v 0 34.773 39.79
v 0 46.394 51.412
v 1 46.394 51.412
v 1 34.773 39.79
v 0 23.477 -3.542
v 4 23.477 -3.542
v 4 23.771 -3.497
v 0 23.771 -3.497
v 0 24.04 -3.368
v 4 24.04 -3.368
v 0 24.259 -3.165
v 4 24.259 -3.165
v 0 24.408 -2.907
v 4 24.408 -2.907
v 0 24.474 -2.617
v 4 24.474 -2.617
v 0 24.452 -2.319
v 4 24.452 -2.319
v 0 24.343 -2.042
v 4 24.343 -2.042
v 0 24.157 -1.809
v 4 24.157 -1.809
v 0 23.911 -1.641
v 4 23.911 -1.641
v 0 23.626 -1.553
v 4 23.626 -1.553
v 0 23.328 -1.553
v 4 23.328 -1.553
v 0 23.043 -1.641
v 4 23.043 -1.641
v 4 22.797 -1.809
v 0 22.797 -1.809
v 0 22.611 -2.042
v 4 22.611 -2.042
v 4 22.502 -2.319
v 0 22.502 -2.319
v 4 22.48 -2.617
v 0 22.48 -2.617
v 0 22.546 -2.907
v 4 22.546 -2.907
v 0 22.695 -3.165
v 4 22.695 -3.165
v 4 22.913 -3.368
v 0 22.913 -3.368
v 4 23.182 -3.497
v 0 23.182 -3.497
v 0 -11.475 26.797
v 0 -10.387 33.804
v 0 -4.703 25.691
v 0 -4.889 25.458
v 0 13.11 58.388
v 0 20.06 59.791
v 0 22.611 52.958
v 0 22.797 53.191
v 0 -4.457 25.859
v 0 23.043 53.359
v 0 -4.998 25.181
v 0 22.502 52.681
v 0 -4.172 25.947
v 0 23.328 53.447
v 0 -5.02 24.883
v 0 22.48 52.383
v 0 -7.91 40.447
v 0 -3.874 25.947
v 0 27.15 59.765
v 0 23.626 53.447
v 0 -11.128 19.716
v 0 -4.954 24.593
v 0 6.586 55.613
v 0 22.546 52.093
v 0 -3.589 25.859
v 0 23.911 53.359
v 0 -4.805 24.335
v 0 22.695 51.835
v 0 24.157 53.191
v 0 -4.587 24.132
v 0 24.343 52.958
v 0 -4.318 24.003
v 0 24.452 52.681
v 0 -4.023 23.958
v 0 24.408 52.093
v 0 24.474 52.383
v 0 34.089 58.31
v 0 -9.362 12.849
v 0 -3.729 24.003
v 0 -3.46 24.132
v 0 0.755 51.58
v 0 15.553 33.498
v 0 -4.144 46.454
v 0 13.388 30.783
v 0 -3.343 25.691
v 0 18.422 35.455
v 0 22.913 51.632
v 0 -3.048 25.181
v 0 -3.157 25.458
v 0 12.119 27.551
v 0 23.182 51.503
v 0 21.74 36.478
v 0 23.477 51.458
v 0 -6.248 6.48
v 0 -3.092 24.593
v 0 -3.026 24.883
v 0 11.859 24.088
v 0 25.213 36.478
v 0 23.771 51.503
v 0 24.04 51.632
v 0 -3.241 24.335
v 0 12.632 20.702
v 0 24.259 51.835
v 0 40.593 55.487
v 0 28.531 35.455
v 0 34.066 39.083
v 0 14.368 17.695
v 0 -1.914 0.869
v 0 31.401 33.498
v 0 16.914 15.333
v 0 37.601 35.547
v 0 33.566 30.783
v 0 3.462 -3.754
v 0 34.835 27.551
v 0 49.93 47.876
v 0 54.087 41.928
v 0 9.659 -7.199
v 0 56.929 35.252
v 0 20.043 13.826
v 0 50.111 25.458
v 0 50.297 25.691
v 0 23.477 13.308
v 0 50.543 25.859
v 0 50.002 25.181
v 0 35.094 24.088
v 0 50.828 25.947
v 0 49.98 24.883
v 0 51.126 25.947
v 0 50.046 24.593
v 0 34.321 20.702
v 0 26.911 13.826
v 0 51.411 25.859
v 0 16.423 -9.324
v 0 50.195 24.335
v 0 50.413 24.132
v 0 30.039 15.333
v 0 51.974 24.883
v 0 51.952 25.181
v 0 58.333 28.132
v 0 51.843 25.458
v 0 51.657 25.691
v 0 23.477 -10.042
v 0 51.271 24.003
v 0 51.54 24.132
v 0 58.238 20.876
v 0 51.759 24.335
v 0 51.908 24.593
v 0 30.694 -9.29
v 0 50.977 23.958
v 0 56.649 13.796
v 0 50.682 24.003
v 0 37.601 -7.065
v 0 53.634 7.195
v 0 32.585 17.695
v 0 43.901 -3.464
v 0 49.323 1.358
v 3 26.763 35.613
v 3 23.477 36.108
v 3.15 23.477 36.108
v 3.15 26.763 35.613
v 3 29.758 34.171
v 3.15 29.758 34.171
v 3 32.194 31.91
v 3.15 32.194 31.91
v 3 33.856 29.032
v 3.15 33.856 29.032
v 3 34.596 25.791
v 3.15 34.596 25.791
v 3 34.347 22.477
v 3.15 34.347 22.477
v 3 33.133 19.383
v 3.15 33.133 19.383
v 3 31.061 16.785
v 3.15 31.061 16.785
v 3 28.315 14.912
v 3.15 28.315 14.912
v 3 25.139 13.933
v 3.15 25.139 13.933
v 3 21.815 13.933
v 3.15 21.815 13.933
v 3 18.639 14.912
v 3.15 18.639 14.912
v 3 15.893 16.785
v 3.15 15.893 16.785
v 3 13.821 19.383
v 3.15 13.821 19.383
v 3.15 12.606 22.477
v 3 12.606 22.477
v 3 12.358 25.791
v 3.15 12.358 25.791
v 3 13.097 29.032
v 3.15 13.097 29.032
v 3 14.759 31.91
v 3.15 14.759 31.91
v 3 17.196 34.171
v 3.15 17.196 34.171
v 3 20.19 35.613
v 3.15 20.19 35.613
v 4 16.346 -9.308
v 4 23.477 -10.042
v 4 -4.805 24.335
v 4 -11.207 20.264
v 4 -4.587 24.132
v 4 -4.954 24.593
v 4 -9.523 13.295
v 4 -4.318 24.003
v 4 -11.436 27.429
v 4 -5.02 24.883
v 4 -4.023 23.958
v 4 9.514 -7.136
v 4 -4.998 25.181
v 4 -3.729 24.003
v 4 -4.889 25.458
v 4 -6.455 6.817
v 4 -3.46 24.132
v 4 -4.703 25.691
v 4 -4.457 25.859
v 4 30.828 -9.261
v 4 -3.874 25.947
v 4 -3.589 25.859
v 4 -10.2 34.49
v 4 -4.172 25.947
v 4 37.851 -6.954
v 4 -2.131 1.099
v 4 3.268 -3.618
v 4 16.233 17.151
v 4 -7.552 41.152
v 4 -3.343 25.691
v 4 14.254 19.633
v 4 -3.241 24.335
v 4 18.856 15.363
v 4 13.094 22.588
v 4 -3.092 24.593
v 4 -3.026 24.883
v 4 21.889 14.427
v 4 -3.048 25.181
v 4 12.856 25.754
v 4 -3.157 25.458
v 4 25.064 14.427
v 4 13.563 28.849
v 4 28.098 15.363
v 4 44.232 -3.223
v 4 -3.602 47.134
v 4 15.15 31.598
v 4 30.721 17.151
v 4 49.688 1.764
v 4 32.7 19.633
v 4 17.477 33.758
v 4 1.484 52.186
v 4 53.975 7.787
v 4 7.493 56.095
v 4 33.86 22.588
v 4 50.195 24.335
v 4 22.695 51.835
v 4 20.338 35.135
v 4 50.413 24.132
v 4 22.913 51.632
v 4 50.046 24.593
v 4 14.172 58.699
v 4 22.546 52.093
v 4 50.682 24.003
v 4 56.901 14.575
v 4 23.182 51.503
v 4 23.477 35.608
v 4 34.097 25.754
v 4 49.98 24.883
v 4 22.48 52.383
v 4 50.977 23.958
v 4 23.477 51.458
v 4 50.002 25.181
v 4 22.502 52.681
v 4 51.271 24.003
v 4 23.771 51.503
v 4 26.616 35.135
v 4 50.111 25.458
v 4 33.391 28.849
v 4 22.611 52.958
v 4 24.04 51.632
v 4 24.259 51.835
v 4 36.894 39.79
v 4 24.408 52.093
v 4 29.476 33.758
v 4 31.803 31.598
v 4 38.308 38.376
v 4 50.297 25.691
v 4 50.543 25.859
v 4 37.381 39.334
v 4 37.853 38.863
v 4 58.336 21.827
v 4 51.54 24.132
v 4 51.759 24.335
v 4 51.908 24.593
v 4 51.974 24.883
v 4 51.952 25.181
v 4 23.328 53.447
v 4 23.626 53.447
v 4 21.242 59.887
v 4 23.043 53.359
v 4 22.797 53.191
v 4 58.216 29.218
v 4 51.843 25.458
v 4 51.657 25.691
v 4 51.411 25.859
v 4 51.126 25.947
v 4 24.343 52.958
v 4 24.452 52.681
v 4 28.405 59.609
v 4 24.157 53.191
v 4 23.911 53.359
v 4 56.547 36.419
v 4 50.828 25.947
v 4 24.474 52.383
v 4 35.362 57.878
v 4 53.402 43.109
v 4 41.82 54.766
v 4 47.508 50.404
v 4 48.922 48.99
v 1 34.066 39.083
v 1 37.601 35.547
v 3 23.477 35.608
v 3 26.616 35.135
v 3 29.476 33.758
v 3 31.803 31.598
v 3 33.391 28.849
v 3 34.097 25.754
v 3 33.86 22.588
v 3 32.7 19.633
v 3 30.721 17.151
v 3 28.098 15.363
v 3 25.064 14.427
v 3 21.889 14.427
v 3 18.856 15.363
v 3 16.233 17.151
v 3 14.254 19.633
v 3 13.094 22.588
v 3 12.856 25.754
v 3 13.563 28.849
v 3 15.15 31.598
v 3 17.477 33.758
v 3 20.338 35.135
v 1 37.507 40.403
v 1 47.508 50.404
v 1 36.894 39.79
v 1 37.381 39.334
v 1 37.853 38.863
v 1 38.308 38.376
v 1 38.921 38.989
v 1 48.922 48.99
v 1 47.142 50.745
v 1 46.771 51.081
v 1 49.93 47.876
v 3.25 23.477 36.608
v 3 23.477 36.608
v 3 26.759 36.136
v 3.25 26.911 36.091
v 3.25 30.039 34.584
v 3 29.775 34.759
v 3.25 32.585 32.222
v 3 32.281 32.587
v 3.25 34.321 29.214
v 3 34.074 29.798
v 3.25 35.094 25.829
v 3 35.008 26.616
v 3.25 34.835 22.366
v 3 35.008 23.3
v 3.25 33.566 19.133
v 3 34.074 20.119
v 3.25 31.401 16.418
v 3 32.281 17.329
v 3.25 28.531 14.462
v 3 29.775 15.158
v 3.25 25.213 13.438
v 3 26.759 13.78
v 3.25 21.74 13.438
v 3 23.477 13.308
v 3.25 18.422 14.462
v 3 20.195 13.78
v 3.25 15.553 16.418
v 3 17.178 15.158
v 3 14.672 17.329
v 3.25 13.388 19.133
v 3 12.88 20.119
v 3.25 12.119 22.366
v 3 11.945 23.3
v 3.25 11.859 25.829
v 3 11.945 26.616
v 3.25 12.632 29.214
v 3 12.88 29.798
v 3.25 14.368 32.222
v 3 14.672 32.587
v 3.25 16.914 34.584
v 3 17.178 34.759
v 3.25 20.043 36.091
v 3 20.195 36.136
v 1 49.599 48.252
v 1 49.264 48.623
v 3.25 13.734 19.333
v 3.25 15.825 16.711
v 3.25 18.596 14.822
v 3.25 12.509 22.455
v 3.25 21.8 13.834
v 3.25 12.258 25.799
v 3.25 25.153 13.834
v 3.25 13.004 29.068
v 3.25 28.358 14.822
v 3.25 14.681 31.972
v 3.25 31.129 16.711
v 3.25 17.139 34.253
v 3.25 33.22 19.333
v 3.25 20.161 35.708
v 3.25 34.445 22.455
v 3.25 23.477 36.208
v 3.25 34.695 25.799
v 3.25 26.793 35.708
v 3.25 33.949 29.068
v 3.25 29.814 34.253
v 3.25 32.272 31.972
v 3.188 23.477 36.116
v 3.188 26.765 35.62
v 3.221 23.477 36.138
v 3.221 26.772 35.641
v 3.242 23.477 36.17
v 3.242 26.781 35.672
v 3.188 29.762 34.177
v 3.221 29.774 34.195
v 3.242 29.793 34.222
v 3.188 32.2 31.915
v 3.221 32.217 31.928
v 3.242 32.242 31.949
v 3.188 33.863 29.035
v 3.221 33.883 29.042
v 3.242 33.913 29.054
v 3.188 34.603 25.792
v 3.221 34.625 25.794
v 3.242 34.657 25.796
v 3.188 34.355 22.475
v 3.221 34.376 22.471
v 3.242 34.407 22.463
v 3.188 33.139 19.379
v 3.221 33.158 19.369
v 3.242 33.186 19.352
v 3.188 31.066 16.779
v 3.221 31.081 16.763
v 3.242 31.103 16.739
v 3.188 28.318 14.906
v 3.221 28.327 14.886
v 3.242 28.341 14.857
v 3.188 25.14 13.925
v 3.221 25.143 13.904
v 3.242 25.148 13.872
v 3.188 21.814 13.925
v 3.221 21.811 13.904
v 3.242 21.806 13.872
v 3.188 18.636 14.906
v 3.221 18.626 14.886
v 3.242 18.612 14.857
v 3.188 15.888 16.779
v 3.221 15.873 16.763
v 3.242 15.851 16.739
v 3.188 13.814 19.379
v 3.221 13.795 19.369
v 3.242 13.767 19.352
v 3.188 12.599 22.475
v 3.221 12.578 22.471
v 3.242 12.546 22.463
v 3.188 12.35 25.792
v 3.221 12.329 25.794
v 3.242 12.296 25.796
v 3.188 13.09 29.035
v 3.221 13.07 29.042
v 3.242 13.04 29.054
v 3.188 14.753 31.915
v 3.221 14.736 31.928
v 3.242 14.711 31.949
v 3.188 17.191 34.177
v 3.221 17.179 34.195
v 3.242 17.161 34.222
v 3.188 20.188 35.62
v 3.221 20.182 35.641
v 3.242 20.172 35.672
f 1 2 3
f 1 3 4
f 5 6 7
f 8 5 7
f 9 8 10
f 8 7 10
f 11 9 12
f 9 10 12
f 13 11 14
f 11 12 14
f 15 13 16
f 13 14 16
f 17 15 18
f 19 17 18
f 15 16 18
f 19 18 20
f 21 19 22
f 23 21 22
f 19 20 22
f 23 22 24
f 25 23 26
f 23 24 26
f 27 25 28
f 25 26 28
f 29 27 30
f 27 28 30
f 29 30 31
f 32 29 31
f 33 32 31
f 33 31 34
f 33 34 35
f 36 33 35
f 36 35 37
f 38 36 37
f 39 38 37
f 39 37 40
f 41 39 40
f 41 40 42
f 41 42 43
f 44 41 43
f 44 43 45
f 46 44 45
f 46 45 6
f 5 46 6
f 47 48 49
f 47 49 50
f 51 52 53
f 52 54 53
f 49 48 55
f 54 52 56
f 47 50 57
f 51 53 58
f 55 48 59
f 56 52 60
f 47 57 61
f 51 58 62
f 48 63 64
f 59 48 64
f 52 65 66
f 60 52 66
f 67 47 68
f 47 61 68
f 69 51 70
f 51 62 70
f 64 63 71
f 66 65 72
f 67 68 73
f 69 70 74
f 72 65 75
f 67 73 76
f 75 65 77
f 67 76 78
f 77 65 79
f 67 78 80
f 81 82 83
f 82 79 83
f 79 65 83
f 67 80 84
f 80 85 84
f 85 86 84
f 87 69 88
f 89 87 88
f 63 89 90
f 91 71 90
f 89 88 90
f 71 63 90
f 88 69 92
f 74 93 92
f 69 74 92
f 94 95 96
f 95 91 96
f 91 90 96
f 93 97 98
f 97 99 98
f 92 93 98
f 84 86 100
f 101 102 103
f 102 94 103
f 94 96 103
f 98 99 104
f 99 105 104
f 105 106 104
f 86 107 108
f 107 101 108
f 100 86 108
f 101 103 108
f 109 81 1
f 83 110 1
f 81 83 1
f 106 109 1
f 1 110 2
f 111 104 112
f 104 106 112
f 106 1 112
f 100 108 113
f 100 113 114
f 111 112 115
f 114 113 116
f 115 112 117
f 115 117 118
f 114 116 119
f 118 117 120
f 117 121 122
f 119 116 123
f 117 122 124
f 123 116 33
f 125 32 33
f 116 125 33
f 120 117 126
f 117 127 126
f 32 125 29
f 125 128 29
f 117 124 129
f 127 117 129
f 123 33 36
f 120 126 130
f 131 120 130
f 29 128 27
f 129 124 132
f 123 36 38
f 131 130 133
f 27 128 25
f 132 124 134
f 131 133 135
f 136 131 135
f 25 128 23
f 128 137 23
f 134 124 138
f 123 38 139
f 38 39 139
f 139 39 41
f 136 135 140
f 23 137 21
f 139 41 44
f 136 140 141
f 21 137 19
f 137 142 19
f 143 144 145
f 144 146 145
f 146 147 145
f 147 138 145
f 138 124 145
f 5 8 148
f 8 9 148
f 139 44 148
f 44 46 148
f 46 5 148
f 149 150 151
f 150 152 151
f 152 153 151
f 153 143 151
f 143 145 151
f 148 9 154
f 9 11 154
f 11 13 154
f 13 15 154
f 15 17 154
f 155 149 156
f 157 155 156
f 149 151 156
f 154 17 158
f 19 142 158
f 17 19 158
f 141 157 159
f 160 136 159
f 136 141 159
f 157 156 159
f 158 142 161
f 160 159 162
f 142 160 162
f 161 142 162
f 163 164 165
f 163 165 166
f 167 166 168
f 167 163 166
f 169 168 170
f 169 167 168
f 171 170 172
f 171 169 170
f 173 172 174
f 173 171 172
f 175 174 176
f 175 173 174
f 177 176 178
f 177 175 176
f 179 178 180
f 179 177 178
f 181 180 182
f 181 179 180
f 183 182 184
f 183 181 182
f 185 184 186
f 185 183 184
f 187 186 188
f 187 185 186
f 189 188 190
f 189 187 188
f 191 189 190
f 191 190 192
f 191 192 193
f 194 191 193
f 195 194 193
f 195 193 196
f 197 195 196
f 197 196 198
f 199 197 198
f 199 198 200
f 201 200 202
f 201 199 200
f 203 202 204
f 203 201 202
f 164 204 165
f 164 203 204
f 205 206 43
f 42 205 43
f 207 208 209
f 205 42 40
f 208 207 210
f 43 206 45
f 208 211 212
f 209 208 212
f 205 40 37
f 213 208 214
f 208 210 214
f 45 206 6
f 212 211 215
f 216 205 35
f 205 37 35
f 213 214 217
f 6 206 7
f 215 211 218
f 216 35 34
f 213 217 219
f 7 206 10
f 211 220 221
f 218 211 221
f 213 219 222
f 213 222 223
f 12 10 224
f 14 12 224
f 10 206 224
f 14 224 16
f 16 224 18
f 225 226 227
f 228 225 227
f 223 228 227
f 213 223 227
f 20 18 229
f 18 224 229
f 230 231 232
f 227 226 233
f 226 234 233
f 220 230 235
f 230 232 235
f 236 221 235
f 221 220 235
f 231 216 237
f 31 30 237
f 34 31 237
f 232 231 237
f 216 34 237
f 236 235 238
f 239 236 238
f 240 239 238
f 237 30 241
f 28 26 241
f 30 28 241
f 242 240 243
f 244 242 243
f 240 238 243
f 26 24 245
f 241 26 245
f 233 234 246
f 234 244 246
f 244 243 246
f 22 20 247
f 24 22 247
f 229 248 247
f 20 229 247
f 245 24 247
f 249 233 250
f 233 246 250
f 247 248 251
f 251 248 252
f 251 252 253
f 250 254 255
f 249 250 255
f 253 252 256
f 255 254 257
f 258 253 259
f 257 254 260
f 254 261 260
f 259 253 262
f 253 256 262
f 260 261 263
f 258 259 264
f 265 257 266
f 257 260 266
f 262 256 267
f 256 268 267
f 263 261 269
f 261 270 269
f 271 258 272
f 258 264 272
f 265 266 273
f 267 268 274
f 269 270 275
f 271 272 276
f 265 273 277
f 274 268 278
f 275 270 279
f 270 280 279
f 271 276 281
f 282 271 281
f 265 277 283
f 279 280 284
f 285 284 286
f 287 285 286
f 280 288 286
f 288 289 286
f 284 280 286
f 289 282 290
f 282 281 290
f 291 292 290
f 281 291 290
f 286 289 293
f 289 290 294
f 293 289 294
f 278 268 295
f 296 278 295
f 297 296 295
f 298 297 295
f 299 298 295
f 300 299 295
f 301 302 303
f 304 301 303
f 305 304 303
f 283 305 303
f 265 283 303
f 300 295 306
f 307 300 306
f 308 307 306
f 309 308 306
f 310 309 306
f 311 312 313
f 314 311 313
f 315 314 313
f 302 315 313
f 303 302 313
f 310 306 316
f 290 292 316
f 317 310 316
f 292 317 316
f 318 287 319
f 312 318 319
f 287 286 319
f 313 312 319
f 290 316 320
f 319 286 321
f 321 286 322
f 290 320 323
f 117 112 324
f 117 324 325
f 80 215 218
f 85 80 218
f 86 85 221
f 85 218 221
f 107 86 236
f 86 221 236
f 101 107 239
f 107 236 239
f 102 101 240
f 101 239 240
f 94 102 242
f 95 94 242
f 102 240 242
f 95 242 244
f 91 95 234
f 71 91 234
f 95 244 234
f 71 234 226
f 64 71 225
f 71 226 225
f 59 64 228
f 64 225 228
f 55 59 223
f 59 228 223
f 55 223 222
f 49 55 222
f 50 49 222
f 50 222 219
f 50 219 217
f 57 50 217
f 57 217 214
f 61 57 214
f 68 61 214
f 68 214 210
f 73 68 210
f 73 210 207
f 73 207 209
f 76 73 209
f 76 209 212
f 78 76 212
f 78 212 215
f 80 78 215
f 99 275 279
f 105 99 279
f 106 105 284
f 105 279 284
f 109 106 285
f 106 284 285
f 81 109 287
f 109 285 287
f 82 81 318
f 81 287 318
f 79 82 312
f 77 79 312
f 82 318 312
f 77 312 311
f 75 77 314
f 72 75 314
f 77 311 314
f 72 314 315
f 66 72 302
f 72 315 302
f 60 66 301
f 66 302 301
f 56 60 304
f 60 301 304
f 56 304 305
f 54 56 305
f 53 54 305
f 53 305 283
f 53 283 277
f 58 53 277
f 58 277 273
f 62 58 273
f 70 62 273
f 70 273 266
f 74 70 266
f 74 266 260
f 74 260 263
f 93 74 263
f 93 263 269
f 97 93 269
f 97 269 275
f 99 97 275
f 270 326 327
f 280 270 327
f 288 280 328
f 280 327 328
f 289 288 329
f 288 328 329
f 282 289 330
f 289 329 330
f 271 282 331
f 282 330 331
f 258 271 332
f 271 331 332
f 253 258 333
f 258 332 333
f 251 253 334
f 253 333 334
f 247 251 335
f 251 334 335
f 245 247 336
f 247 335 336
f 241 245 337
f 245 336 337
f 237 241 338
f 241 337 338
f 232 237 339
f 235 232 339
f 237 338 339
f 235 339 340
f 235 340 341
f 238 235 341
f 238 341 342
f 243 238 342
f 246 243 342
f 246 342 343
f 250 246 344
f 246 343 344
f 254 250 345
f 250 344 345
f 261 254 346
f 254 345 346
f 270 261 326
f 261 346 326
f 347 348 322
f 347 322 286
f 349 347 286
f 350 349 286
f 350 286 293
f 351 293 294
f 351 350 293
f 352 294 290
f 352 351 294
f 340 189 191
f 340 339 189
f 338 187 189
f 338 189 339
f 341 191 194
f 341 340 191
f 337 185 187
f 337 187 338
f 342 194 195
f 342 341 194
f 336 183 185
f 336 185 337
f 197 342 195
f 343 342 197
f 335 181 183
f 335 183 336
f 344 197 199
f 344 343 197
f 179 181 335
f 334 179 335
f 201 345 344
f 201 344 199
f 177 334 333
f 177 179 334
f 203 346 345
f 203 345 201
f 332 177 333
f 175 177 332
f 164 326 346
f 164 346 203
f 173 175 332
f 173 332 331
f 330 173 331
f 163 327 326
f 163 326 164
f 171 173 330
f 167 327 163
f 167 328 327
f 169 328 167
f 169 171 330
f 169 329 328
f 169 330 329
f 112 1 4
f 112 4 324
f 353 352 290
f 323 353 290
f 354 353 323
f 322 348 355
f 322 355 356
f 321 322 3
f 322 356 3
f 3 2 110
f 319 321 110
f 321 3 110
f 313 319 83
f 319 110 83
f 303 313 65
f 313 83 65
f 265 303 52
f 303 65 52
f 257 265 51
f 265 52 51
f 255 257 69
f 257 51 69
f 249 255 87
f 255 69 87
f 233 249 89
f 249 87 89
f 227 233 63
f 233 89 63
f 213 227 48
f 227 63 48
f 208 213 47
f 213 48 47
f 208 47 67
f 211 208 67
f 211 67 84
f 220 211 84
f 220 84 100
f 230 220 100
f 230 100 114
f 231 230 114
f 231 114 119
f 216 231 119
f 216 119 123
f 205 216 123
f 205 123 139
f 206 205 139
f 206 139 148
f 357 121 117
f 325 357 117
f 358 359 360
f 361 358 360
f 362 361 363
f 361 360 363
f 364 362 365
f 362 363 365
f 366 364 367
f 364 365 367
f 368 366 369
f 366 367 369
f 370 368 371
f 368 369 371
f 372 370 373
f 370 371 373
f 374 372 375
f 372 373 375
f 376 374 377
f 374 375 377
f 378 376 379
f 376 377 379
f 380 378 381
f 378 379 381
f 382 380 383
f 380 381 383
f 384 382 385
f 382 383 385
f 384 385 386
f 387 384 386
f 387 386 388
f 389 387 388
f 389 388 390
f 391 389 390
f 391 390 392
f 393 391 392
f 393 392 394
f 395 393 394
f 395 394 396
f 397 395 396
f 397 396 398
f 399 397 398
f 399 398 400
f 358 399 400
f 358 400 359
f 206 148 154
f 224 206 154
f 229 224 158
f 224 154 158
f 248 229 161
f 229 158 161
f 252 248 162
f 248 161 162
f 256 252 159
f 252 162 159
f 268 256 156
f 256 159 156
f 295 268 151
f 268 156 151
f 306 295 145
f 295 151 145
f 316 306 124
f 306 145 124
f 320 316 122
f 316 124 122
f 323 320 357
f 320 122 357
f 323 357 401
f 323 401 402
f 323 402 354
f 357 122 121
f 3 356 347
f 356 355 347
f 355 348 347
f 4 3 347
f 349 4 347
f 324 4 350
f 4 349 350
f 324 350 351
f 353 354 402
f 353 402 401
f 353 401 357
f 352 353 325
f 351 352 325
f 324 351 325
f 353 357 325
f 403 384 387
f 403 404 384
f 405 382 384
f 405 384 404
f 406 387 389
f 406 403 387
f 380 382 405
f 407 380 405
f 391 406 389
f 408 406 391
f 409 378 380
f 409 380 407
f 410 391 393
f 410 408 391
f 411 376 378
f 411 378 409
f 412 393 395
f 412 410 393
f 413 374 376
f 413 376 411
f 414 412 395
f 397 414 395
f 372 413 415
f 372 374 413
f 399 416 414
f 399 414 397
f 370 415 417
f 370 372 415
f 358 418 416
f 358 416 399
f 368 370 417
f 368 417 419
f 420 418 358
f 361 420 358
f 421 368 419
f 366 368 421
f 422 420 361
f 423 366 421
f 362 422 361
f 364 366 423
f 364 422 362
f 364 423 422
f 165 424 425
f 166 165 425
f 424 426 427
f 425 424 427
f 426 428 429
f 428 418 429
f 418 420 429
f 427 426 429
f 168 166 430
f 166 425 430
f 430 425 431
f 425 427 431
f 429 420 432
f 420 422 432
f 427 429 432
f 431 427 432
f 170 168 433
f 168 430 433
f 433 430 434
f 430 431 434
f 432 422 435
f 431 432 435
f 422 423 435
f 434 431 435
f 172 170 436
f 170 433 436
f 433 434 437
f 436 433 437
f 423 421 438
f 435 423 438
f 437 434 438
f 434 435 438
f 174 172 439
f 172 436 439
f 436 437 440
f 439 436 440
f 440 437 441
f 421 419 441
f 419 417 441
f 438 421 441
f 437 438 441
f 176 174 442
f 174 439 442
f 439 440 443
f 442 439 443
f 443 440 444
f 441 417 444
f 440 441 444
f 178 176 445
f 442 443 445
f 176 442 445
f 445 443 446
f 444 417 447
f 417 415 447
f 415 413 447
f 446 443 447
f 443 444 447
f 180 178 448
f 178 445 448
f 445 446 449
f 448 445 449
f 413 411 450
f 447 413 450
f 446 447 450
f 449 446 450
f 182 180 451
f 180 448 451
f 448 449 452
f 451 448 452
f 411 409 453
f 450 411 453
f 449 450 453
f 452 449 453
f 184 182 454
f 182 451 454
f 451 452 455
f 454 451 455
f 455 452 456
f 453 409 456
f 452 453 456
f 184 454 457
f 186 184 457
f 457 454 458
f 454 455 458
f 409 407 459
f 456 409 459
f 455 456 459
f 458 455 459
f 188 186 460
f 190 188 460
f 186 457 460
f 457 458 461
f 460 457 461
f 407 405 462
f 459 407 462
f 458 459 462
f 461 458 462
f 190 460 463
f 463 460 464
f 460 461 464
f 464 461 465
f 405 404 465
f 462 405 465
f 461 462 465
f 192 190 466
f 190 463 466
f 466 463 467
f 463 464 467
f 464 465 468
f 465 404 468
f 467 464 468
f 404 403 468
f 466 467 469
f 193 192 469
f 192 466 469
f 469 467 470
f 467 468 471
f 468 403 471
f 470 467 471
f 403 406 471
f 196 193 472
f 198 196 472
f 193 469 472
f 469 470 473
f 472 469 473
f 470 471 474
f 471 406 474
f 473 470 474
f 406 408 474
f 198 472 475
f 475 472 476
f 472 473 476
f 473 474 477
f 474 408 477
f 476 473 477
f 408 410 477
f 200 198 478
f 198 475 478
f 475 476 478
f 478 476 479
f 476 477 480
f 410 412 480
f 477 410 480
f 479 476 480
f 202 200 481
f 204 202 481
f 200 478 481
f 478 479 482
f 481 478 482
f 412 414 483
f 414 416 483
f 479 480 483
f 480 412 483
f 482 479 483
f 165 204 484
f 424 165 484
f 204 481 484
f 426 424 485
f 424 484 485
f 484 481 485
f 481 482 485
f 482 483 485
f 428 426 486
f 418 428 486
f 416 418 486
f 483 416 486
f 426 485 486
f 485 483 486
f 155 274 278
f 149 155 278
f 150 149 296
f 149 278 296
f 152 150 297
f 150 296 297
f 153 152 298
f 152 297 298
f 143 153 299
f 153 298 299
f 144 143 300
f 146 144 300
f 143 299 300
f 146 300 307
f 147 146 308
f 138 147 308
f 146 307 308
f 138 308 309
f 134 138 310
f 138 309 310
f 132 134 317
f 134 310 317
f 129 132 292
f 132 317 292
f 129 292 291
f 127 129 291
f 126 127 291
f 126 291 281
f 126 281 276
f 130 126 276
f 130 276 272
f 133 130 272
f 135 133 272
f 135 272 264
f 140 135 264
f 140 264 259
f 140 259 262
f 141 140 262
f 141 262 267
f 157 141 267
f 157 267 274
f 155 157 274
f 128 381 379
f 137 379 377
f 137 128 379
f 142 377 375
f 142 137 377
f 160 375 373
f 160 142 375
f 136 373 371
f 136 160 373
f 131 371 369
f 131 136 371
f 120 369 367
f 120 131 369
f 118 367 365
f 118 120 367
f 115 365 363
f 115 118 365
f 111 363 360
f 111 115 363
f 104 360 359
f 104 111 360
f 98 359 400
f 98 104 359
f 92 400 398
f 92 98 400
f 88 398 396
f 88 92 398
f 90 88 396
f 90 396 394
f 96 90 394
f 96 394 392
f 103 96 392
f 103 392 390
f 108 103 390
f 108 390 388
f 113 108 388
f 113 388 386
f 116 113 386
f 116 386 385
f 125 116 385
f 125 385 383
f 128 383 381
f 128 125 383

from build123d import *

# Parameters (mm, degrees)
SKETCH1_R           = 35
SKETCH1_R_2         = 11.65
BOSS_EXTRUDE1_DEPTH = 4
CUT_EXTRUDE1_DEPTH  = 10
SKETCH6_R           = 1
CUT_EXTRUDE4_DEPTH  = 10
BOSS_EXTRUDE3_START = 1
SKETCH7_R           = 11.65
SKETCH7_R_2         = 10.65
BOSS_EXTRUDE3_DEPTH = 1
SKETCH8_R           = 11.65
SKETCH8_R_2         = 11.15
CUT_EXTRUDE5_DEPTH  = 0.25
FILLET1_R           = 0.1
CUT_EXTRUDE6_DEPTH  = 1


with BuildPart() as part:
    # Sketch1 → Boss-Extrude1 (new body)
    with BuildSketch(Plane(origin=(0, 0, 0), x_dir=(0, -0.16775650988153862, -0.9858284604292805), z_dir=(1, 0, 0))):
        with Locations(Location((-28.542888787, 18.957113921, 0), (0, 0, 9.65740334))):
            Circle(SKETCH1_R)
        with Locations(Location((-28.542888787, 18.957113921, 0), (0, 0, 9.65740334))):
            Circle(SKETCH1_R_2, mode=Mode.SUBTRACT)
    extrude(amount=BOSS_EXTRUDE1_DEPTH)

    # Sketch2 → Cut-Extrude1 (cut)
    with BuildSketch(Plane.ZY):
        with BuildLine():
            Line((38.375552951, 38.308271509), (48.999843401, 48.932561958))
            Line((48.999843401, 48.932561958), (51.312030188, 52.930544456))
            Line((51.312030188, 52.930544456), (54.007279042, 51.111570475))
            Line((54.007279042, 51.111570475), (50.414056963, 47.518348396))
            Line((50.414056963, 47.518348396), (39.789766514, 36.894057946))
            ThreePointArc((39.789766514, 36.894057946), (39.100348464, 37.618853459), (38.375552951, 38.308271509))
        make_face()
    extrude(amount=-CUT_EXTRUDE1_DEPTH, mode=Mode.SUBTRACT)

    # Sketch6 → Cut-Extrude4 (cut)
    with BuildSketch(Plane(origin=(4, 0, 0), x_dir=(0, 0, -1), z_dir=(1, 0, 0))):
        with Locations((-24.958212841, -4.023282164)):
            Circle(SKETCH6_R)
        with Locations((2.541787159, 23.476717836)):
            Circle(SKETCH6_R)
        with Locations((-52.458212841, 23.476717836)):
            Circle(SKETCH6_R)
        with Locations((-24.958212841, 50.976717836)):
            Circle(SKETCH6_R)
    extrude(amount=-CUT_EXTRUDE4_DEPTH, mode=Mode.SUBTRACT)

    # Sketch7 → Boss-Extrude3 (add)
    with BuildSketch(Plane.ZY.offset(-4).offset(BOSS_EXTRUDE3_START)):
        with Locations((24.958212841, 23.476717836)):
            Circle(SKETCH7_R)
        with Locations((24.958212841, 23.476717836)):
            Circle(SKETCH7_R_2, mode=Mode.SUBTRACT)
    extrude(amount=-BOSS_EXTRUDE3_DEPTH)

    # Sketch8 → Cut-Extrude5 (cut)
    with BuildSketch(Plane.ZY.offset(-3)):
        with Locations((24.958212841, 23.476717836)):
            Circle(SKETCH8_R)
        with Locations((24.958212841, 23.476717836)):
            Circle(SKETCH8_R_2, mode=Mode.SUBTRACT)
    extrude(amount=-CUT_EXTRUDE5_DEPTH, mode=Mode.SUBTRACT)

    # Fillet1
    fillet1_edges = [part.edges().sort_by_distance(p)[0] for p in [
        (3.25, 23.476717836, 13.808212841),
    ]]
    fillet(fillet1_edges, radius=FILLET1_R)

    # Sketch9 → Cut-Extrude6 (cut)
    with BuildSketch(Plane.ZY):
        Polygon((36.254232608, 38.308271509), (48.989739813, 51.043778714), (52.525273719, 47.508244808), (39.789766514, 34.772737603), (39.082659732, 34.065630822), (35.547125827, 37.601164728), align=None)
        Polygon((48.989739813, 48.922458371), (50.403953376, 47.508244808), (40.402946038, 37.507237471), (38.988732476, 38.921451033), align=None, mode=Mode.SUBTRACT)
    extrude(amount=-CUT_EXTRUDE6_DEPTH, mode=Mode.SUBTRACT)


solid = part.part
